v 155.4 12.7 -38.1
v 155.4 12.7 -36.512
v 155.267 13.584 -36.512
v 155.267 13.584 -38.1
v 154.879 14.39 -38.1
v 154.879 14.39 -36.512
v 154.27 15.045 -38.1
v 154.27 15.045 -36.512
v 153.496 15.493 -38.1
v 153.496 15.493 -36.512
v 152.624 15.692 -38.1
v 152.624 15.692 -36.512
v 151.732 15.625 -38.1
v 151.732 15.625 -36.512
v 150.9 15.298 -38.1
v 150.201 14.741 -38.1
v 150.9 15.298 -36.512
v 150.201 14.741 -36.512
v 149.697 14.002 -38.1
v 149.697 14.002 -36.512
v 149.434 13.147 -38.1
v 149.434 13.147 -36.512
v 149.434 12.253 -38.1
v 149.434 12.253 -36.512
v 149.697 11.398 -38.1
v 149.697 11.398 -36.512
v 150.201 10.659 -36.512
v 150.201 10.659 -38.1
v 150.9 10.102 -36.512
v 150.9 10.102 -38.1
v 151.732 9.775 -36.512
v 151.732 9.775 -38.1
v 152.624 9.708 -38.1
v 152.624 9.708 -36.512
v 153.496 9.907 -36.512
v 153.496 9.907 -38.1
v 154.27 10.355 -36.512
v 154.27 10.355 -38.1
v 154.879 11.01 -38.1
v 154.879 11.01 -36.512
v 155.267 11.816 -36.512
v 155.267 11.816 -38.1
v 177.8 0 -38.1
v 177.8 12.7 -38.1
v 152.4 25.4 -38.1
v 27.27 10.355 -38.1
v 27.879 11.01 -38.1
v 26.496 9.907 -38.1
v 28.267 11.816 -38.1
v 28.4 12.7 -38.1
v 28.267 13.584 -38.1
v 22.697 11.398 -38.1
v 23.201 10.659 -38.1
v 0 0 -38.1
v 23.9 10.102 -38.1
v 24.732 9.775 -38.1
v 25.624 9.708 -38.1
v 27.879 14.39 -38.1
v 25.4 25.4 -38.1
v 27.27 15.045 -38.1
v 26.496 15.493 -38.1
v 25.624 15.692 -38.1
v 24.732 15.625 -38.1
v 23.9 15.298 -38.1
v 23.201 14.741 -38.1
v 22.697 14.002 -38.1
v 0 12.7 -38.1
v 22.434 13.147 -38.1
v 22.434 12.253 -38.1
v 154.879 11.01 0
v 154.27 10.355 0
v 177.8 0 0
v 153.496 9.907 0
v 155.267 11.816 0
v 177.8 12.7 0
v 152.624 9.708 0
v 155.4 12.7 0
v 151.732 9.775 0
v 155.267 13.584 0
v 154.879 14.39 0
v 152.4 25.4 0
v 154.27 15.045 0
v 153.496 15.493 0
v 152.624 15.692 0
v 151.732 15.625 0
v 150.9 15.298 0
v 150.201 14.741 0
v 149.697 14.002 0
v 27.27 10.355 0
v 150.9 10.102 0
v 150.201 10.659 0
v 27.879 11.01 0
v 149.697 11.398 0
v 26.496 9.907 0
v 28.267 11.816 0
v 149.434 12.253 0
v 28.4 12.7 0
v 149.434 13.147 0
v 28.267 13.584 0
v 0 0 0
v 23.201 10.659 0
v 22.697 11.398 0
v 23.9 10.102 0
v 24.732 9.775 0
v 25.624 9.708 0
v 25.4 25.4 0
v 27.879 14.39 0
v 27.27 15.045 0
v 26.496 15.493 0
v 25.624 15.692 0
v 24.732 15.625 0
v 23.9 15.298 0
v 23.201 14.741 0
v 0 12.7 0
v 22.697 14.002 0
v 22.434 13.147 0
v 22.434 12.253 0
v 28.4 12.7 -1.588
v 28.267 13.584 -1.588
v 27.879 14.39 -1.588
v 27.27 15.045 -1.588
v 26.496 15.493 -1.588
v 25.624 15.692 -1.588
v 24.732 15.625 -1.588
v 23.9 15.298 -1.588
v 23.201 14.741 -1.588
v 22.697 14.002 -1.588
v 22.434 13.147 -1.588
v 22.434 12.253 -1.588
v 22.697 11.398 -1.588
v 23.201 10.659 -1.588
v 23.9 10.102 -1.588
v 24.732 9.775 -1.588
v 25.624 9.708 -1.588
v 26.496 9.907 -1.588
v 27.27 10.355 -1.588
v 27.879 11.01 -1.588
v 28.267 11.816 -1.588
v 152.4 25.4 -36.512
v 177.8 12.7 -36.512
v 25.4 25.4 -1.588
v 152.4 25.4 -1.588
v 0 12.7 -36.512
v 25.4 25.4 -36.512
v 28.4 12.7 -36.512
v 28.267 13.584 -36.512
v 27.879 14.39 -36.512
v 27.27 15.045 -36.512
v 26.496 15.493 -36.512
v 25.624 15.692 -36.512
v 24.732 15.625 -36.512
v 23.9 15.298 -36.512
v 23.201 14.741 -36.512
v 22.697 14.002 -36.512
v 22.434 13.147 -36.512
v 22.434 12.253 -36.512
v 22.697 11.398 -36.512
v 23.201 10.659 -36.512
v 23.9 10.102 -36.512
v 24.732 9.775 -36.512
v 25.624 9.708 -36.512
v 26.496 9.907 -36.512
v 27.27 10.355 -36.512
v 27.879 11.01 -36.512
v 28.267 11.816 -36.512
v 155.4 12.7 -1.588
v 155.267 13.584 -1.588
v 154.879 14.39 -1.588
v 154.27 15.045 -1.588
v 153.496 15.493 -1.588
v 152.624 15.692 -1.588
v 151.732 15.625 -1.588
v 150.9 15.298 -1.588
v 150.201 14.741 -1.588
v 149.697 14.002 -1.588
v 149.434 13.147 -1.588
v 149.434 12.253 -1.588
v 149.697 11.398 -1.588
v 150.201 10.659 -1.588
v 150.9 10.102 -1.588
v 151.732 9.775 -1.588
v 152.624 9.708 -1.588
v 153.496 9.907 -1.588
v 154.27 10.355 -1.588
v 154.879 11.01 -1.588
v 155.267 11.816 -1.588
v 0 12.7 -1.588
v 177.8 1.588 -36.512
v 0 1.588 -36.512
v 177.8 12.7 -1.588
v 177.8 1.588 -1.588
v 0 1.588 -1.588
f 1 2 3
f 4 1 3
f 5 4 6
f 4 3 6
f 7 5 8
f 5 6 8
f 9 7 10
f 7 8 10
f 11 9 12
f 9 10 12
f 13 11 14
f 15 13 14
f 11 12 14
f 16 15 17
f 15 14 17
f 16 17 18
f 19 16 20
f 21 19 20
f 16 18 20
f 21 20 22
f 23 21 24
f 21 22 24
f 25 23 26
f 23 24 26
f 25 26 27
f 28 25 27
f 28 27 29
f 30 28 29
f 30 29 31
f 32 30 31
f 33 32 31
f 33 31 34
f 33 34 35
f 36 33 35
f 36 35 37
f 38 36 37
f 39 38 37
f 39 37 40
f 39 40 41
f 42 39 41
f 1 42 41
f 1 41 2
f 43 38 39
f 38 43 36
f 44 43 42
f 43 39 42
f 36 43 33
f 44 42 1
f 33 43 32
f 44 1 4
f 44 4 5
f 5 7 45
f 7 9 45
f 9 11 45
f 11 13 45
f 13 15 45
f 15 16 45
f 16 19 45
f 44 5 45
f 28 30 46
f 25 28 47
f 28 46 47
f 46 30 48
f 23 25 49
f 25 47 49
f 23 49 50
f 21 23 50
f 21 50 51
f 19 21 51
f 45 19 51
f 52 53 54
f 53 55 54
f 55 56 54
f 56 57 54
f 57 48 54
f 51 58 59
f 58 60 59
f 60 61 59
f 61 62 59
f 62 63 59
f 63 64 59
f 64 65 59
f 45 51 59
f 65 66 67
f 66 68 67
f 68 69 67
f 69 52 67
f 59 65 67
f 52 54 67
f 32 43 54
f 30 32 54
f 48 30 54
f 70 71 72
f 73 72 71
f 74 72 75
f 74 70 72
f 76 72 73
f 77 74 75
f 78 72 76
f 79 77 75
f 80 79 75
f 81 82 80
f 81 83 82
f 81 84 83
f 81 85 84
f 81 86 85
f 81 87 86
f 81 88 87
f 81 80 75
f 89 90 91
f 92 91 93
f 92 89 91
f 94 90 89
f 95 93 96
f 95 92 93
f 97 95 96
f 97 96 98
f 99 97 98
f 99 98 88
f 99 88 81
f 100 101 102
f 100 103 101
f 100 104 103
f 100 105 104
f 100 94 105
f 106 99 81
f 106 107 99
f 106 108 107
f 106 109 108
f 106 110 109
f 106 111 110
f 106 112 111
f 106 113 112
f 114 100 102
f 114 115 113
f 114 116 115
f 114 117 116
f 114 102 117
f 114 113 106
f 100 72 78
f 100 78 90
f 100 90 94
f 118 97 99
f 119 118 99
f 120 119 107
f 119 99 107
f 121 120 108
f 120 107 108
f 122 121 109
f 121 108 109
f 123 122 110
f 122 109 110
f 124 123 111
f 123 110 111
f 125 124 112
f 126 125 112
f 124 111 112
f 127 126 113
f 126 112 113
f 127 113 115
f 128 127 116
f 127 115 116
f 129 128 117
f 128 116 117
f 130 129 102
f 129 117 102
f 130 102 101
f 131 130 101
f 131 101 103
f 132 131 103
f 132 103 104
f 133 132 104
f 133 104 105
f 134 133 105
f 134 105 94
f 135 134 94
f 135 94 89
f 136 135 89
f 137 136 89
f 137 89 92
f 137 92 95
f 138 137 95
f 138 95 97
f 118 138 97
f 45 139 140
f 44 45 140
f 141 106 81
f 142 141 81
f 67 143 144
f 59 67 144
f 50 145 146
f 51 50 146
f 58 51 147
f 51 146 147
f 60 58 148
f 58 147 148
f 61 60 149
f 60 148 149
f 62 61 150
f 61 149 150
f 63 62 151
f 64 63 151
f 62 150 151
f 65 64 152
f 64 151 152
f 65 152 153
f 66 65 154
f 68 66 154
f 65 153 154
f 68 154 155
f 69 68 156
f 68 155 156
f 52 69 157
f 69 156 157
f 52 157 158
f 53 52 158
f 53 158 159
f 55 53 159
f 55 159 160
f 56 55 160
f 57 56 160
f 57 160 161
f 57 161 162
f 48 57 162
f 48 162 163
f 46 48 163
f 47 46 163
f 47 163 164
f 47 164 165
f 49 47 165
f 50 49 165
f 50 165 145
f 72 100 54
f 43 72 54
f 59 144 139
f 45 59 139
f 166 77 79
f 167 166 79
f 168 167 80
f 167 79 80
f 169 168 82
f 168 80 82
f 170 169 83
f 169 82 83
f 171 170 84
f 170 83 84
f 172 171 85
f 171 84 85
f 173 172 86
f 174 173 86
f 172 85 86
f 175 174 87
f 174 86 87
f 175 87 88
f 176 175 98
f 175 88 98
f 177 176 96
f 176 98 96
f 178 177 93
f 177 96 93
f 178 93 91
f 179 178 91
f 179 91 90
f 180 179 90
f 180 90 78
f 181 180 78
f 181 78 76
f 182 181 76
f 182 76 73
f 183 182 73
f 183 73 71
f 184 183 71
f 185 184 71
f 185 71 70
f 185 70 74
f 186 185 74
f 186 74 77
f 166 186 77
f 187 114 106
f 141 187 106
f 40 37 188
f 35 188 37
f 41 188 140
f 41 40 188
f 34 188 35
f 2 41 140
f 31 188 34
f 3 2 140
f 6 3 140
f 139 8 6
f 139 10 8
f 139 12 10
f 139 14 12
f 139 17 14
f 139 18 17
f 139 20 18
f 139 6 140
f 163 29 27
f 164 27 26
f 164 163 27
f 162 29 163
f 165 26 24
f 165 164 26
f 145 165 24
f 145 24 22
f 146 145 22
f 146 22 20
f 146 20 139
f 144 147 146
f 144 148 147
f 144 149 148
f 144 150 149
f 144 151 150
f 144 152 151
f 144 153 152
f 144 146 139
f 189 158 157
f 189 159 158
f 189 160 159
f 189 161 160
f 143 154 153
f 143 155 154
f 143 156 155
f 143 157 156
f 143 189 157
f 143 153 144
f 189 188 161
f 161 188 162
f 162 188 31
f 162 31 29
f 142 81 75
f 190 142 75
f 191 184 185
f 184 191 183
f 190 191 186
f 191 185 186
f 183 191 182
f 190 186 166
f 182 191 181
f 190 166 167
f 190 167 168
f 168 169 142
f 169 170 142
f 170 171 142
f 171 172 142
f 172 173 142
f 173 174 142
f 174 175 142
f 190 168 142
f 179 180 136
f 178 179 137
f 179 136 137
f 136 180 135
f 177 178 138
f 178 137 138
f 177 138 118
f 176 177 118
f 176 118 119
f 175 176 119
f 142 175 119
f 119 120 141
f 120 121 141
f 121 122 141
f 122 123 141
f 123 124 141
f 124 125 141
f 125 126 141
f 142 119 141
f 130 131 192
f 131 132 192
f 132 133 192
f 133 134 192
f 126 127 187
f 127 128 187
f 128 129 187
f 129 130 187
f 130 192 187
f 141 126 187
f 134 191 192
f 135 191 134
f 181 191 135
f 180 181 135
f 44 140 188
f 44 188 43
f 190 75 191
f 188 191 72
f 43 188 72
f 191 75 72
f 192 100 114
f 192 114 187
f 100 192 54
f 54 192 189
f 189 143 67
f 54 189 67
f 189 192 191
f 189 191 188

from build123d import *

# Parameters (mm, degrees)
SKETCH2_W           = 38.1
SKETCH2_H           = 38.1
SKETCH2_W_2         = 34.925
SKETCH2_H_2         = 34.925
BOSS_EXTRUDE1_DEPTH = 228.6
SKETCH3_R           = 3
CUT_EXTRUDE1_DEPTH  = 228.6


with BuildPart() as part:
    # Sketch2 → Boss-Extrude1 (new body)
    with BuildSketch(Plane(origin=(0, 0, 0), x_dir=(0, 0, -1), z_dir=(1, 0, 0))):
        with Locations((19.05, 19.05)):
            Rectangle(SKETCH2_W, SKETCH2_H)
        with Locations((19.05, 19.05)):
            Rectangle(SKETCH2_W_2, SKETCH2_H_2, mode=Mode.SUBTRACT)
    extrude(amount=BOSS_EXTRUDE1_DEPTH)

    # Sketch3 → Cut-Extrude1 (cut)
    with BuildSketch(Plane.XY):
        with Locations((25.4, 12.7)):
            Circle(SKETCH3_R)
        with Locations((152.4, 12.7)):
            Circle(SKETCH3_R)
        Polygon((0, 12.7), (25.4, 25.4), (152.4, 25.4), (177.8, 12.7), (177.8, 0), (228.6, 0), (228.6, 38.1), (0, 38.1), align=None)
    extrude(amount=-CUT_EXTRUDE1_DEPTH, mode=Mode.SUBTRACT)


solid = part.part
